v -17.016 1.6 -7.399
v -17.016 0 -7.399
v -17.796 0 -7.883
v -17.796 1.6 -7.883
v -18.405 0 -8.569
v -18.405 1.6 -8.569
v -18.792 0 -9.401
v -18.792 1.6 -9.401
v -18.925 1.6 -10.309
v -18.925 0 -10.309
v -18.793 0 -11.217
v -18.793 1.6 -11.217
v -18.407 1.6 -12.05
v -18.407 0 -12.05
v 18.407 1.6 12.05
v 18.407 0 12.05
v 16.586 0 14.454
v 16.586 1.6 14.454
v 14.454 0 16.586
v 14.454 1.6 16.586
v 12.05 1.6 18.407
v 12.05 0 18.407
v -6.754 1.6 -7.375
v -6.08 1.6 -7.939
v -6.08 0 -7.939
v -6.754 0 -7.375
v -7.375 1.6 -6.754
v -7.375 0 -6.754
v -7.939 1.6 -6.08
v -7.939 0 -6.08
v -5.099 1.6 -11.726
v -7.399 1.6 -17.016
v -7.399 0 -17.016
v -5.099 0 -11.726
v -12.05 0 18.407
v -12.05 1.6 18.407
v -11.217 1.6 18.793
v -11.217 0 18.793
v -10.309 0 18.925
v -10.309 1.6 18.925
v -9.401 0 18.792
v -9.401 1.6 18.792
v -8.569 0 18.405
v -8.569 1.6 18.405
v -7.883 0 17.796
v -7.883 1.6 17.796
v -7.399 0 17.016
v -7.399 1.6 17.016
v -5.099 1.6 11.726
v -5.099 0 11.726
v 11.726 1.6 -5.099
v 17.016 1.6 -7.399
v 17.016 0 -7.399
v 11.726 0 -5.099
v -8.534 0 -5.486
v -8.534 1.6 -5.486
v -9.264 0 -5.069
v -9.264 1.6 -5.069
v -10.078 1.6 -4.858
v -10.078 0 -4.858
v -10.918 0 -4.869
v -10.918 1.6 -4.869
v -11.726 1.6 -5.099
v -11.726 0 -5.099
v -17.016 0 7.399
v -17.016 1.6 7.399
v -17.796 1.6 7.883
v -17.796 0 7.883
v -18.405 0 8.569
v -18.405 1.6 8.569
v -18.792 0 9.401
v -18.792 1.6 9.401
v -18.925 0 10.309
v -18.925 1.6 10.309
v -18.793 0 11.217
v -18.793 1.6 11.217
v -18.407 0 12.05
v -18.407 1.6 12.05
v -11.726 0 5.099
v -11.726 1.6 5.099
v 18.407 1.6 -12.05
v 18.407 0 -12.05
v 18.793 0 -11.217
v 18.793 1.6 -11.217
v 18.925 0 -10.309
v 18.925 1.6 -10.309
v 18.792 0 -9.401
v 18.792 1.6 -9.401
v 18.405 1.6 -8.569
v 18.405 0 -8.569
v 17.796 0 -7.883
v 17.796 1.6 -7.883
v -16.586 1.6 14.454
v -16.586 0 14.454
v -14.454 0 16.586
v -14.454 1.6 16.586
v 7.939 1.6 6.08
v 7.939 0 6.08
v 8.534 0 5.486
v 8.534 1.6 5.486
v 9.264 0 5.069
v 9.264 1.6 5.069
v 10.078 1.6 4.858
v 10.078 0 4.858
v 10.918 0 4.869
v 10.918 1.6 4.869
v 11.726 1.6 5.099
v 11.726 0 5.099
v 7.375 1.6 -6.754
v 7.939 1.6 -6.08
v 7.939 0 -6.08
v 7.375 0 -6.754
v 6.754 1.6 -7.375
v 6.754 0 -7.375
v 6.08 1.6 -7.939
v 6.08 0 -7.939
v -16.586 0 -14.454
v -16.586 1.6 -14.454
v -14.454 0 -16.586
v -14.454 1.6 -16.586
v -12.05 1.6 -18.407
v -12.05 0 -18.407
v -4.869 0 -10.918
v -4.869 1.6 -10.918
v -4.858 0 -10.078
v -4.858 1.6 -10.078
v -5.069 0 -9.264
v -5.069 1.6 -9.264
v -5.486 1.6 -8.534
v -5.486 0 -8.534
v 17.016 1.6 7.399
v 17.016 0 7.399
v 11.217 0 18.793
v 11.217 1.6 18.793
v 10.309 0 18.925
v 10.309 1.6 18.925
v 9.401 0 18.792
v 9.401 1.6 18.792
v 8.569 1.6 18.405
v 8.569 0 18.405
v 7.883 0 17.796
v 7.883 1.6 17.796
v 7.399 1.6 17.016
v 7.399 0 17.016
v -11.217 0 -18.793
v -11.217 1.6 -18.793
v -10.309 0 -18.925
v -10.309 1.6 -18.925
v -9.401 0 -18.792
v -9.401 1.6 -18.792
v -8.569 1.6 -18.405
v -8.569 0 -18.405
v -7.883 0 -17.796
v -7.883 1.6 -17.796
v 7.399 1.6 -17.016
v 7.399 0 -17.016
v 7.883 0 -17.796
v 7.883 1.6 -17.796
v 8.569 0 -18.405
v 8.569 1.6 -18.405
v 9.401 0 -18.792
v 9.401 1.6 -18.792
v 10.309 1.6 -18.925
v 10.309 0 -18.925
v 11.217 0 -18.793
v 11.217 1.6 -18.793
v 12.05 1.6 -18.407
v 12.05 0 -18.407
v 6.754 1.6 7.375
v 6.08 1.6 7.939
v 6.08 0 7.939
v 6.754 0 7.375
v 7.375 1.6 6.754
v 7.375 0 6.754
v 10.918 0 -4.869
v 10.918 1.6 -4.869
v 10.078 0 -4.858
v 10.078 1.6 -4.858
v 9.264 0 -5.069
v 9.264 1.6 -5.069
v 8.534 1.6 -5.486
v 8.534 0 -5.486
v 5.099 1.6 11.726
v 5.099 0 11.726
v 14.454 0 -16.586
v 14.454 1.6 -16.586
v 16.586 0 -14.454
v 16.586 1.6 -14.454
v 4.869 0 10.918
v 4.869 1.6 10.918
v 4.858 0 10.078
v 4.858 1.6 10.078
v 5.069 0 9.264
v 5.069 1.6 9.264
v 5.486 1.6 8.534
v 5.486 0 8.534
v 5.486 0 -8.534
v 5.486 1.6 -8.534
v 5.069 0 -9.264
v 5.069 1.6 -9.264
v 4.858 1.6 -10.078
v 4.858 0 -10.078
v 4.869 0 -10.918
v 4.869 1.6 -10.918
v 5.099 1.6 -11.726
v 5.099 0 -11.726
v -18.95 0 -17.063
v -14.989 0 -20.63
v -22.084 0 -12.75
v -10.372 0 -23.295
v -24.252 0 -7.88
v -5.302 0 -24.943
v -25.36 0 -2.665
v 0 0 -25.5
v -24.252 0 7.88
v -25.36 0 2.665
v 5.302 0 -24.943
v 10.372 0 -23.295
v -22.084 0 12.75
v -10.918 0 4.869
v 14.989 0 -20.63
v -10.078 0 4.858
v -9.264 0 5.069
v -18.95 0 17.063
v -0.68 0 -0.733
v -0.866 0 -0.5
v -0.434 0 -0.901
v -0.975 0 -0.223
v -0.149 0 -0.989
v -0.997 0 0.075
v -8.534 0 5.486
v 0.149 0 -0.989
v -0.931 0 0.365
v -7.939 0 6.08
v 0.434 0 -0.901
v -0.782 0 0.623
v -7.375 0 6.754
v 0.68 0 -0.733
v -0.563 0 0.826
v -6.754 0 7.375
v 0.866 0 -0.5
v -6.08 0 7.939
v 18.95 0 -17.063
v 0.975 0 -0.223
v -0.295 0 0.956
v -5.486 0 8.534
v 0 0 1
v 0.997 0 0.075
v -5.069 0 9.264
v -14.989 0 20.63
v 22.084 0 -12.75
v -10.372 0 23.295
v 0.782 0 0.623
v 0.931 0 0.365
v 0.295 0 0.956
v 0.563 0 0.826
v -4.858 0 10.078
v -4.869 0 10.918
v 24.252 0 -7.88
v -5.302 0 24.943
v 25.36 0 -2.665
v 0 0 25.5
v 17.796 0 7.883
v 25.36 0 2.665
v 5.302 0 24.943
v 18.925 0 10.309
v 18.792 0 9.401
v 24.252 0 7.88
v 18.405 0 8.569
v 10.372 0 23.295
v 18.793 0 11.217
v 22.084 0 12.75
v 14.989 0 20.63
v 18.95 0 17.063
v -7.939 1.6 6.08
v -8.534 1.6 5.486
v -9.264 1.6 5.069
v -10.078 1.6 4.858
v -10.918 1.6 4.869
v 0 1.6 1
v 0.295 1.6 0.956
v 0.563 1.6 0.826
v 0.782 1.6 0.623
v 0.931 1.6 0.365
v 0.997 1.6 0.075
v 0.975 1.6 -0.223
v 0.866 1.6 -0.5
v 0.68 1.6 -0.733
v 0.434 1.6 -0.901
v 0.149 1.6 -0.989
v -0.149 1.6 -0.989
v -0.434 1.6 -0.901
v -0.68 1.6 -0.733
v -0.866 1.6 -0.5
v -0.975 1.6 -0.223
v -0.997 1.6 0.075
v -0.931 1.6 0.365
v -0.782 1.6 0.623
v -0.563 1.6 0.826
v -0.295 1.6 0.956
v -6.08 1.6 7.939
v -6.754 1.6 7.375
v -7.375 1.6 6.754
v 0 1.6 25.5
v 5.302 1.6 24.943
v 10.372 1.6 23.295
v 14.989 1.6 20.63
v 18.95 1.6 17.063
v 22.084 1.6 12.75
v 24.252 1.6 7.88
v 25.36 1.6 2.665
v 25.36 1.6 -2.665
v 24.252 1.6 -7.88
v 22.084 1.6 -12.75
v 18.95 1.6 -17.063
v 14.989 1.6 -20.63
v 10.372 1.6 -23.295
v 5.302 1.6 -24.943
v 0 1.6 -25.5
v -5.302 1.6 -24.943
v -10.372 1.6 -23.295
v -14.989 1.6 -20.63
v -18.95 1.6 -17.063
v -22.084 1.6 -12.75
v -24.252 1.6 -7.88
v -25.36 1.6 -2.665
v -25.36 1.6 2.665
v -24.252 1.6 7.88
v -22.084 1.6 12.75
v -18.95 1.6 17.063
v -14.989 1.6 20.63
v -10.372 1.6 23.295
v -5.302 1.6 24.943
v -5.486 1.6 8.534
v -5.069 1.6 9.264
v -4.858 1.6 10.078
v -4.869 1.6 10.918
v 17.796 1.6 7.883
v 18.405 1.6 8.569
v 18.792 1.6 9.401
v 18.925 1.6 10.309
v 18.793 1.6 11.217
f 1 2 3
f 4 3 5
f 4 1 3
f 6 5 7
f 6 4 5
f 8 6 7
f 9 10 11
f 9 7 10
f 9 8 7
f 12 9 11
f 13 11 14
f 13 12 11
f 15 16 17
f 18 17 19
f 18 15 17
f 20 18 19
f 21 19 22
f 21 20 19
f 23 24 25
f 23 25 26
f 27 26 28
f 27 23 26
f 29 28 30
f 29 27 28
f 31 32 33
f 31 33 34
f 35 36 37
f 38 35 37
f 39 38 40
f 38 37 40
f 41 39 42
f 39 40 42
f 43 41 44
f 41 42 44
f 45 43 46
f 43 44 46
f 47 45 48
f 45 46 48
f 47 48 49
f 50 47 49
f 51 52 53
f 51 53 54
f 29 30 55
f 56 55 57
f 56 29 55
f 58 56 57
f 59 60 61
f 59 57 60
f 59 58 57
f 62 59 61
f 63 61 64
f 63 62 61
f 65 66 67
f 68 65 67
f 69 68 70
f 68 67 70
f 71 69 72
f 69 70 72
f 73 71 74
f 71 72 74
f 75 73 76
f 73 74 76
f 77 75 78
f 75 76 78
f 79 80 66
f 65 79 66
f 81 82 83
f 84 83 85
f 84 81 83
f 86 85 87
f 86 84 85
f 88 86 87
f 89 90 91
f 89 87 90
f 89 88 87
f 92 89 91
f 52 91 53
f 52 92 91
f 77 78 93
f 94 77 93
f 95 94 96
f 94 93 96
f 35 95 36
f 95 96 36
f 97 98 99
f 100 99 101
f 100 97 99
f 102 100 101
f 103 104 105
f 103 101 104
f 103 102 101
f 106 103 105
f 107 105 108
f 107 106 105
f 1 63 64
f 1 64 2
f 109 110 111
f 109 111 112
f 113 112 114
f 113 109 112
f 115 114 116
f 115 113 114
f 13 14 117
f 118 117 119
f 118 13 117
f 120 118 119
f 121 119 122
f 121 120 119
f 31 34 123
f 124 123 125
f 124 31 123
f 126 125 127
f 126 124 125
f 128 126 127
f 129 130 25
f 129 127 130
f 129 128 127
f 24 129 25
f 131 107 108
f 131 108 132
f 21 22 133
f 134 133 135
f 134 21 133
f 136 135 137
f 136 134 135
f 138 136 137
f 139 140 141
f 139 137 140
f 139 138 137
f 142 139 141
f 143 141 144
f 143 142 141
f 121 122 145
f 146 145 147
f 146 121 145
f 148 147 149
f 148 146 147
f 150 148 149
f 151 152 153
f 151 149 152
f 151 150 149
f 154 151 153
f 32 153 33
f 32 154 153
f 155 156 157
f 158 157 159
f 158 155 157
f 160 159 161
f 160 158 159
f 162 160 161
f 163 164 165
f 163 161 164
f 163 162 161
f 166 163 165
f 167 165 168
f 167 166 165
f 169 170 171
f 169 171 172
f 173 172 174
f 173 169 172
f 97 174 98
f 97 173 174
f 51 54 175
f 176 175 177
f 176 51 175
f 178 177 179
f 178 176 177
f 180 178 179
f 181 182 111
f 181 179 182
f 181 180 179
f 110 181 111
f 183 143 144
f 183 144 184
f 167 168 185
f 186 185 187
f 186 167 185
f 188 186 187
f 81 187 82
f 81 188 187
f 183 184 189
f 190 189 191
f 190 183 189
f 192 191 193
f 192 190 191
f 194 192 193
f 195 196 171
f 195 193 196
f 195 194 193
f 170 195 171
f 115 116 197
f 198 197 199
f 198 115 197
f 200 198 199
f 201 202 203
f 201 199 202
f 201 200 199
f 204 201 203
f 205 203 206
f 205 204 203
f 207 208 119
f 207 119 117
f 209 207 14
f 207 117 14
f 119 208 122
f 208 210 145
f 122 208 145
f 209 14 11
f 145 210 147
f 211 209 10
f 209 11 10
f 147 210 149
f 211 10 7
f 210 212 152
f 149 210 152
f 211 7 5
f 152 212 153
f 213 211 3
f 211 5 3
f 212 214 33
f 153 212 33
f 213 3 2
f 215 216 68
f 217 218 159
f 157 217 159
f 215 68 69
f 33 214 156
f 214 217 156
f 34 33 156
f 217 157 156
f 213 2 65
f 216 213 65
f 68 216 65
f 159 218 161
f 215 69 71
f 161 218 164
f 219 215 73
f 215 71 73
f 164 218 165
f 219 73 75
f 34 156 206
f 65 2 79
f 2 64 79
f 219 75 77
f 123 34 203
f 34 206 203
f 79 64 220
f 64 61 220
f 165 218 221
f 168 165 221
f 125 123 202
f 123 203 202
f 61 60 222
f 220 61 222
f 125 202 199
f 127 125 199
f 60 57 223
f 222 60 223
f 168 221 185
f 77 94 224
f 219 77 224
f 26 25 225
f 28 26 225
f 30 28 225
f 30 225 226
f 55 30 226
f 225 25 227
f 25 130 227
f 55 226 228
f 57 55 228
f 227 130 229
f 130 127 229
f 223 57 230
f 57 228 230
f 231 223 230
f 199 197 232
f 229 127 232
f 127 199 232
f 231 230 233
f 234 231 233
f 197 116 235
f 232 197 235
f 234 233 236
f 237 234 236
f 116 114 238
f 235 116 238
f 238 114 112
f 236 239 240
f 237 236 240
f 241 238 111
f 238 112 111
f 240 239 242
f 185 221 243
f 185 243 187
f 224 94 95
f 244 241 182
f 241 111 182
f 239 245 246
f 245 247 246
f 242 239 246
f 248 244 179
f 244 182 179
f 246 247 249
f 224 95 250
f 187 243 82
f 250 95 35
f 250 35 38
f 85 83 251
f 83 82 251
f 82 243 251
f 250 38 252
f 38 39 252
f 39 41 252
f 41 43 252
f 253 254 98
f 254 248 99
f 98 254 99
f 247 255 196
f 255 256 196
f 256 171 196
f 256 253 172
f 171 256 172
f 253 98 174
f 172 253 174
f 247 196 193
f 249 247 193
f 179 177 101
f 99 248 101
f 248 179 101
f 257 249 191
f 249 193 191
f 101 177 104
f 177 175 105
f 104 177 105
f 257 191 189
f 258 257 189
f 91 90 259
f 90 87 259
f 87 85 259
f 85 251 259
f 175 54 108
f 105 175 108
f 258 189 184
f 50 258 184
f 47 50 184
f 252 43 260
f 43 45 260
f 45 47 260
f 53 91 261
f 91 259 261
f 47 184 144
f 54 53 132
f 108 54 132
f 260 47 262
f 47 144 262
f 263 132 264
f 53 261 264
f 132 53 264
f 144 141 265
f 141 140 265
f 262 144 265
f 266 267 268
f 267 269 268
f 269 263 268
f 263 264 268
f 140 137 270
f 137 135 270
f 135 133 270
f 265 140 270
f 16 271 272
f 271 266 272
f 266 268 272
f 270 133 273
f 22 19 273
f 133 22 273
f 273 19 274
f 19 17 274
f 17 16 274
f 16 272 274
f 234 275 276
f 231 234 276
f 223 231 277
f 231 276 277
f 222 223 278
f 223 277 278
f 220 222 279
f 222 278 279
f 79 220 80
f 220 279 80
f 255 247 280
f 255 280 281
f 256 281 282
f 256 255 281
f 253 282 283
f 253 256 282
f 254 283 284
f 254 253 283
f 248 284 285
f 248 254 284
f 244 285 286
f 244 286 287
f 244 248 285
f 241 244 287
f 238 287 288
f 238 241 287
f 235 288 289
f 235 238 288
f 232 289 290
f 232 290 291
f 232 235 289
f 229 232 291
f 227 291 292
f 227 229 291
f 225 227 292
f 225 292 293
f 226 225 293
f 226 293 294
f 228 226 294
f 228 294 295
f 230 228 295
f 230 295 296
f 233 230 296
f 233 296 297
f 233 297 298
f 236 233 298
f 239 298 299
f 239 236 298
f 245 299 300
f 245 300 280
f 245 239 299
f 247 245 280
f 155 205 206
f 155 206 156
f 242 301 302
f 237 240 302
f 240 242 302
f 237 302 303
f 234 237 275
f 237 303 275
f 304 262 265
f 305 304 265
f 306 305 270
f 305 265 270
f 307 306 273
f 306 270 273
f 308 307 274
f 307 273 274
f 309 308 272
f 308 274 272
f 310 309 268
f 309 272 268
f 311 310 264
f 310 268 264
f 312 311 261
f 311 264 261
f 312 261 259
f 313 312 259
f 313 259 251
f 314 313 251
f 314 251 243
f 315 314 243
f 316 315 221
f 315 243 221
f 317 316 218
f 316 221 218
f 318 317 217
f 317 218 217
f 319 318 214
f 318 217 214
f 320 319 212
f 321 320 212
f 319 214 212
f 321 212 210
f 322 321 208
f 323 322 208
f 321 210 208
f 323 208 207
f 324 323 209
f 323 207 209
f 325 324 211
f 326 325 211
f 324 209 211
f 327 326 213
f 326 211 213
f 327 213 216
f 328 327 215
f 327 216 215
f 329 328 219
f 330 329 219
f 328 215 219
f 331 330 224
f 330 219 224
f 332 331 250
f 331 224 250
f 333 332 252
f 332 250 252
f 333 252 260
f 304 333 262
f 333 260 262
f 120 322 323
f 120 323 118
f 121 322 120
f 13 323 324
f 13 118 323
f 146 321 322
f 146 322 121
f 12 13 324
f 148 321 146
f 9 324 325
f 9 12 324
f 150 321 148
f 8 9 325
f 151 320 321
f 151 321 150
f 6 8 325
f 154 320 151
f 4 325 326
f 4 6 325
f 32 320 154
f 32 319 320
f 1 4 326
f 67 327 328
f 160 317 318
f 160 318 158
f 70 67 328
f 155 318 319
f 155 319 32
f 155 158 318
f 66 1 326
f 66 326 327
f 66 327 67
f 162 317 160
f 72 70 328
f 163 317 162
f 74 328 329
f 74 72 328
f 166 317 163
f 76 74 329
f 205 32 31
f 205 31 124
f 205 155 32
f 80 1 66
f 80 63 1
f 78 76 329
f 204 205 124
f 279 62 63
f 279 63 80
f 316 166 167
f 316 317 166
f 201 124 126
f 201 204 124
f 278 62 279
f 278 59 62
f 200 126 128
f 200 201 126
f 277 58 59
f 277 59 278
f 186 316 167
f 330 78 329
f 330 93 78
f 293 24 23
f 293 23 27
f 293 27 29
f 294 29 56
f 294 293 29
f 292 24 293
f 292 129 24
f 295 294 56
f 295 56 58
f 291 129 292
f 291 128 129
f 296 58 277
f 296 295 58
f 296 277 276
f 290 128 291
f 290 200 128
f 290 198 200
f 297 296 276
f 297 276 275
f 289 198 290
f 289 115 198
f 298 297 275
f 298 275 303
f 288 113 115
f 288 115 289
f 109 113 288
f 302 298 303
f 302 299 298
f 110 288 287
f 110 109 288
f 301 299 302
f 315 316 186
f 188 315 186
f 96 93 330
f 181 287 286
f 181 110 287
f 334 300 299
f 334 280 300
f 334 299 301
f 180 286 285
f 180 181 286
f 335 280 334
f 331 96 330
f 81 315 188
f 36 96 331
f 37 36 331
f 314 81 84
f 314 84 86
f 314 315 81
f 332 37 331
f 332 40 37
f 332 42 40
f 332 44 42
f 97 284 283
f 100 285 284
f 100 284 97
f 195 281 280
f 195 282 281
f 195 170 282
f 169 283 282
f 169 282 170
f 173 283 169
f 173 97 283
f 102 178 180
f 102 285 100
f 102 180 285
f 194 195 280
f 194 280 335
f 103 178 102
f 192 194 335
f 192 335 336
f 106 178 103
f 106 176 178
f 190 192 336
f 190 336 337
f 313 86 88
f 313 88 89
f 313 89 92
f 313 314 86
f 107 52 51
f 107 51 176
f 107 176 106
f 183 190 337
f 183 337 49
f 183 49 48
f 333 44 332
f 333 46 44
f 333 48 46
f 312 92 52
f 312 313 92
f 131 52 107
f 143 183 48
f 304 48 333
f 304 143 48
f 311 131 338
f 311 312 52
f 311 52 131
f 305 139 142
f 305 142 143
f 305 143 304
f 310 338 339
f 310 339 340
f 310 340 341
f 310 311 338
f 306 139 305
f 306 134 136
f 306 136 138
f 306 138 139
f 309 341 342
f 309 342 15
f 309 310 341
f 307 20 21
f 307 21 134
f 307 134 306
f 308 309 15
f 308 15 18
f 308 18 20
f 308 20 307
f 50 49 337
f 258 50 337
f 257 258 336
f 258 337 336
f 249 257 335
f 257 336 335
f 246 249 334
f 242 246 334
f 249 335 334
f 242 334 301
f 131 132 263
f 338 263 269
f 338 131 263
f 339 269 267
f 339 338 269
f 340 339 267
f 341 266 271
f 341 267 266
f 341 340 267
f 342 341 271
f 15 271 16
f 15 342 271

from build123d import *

# Parameters (mm, degrees)
SKETCH1_R           = 25.5
SKETCH1_R_2         = 1
BOSS_EXTRUDE1_DEPTH = 1.6
CUT_EXTRUDE1_REACH  = 38.098


with BuildPart() as part:
    # Sketch1 → Boss-Extrude1 (new body)
    with BuildSketch(Plane(origin=(0, 0, 0), x_dir=(1, 0, 0), z_dir=(0, 1, 0))):
        Circle(SKETCH1_R)
        Circle(SKETCH1_R_2, mode=Mode.SUBTRACT)
    extrude(amount=BOSS_EXTRUDE1_DEPTH)

    # Sketch2 → Cut-Extrude1 (cut, up to next)
    with BuildSketch(Plane(origin=(0, 1.6, 0), x_dir=(1, 0, 0), z_dir=(0, 1, 0)), mode=Mode.PRIVATE) as cut_extrude1_sk1:
        with BuildLine():
            Line((5.098689446, 11.726182923), (7.398917645, 17.016345603))
            ThreePointArc((7.398917645, 17.016345603), (9.401129193, 18.792276888), (12.049552955, 18.406745328))
            ThreePointArc((12.049552955, 18.406745328), (15.556349186, 15.556349186), (18.406745328, 12.049552955))
            ThreePointArc((18.406745328, 12.049552955), (18.792276888, 9.401129193), (17.016345603, 7.398917645))
            Line((17.016345603, 7.398917645), (11.726182923, 5.098689446))
            ThreePointArc((11.726182923, 5.098689446), (9.663717077, 4.936869827), (7.939396303, 6.079965983))
            ThreePointArc((7.939396303, 6.079965983), (7.071067812, 7.071067812), (6.079965983, 7.939396303))
            ThreePointArc((6.079965983, 7.939396303), (4.936869827, 9.663717077), (5.098689446, 11.726182923))
        make_face()
    cut_extrude1_tool1 = extrude(cut_extrude1_sk1.sketch, amount=-CUT_EXTRUDE1_REACH, mode=Mode.PRIVATE) & part.part
    # Sketch2 → Cut-Extrude1 (cut, up to next)
    with BuildSketch(Plane(origin=(0, 1.6, 0), x_dir=(1, 0, 0), z_dir=(0, 1, 0)), mode=Mode.PRIVATE) as cut_extrude1_sk2:
        with BuildLine():
            Line((-11.726182923, 5.098689446), (-17.016345603, 7.398917645))
            ThreePointArc((-17.016345603, 7.398917645), (-18.792276888, 9.401129193), (-18.406745328, 12.049552955))
            ThreePointArc((-18.406745328, 12.049552955), (-15.556349186, 15.556349186), (-12.049552955, 18.406745328))
            ThreePointArc((-12.049552955, 18.406745328), (-9.401129193, 18.792276888), (-7.398917645, 17.016345603))
            Line((-7.398917645, 17.016345603), (-5.098689446, 11.726182923))
            ThreePointArc((-5.098689446, 11.726182923), (-4.936869827, 9.663717077), (-6.079965983, 7.939396303))
            ThreePointArc((-6.079965983, 7.939396303), (-7.071067812, 7.071067812), (-7.939396303, 6.079965983))
            ThreePointArc((-7.939396303, 6.079965983), (-9.663717077, 4.936869827), (-11.726182923, 5.098689446))
        make_face()
    cut_extrude1_tool2 = extrude(cut_extrude1_sk2.sketch, amount=-CUT_EXTRUDE1_REACH, mode=Mode.PRIVATE) & part.part
    # Sketch2 → Cut-Extrude1 (cut, up to next)
    with BuildSketch(Plane(origin=(0, 1.6, 0), x_dir=(1, 0, 0), z_dir=(0, 1, 0)), mode=Mode.PRIVATE) as cut_extrude1_sk3:
        with BuildLine():
            Line((-11.726182923, -5.098689446), (-17.016345603, -7.398917645))
            ThreePointArc((-17.016345603, -7.398917645), (-18.792276888, -9.401129193), (-18.406745328, -12.049552955))
            ThreePointArc((-18.406745328, -12.049552955), (-15.556349186, -15.556349186), (-12.049552955, -18.406745328))
            ThreePointArc((-12.049552955, -18.406745328), (-9.401129193, -18.792276888), (-7.398917645, -17.016345603))
            Line((-7.398917645, -17.016345603), (-5.098689446, -11.726182923))
            ThreePointArc((-5.098689446, -11.726182923), (-4.936869827, -9.663717077), (-6.079965983, -7.939396303))
            ThreePointArc((-6.079965983, -7.939396303), (-7.071067812, -7.071067812), (-7.939396303, -6.079965983))
            ThreePointArc((-7.939396303, -6.079965983), (-9.663717077, -4.936869827), (-11.726182923, -5.098689446))
        make_face()
    cut_extrude1_tool3 = extrude(cut_extrude1_sk3.sketch, amount=-CUT_EXTRUDE1_REACH, mode=Mode.PRIVATE) & part.part
    # Sketch2 → Cut-Extrude1 (cut, up to next)
    with BuildSketch(Plane(origin=(0, 1.6, 0), x_dir=(1, 0, 0), z_dir=(0, 1, 0)), mode=Mode.PRIVATE) as cut_extrude1_sk4:
        with BuildLine():
            Line((11.726182923, -5.098689446), (17.016345603, -7.398917645))
            ThreePointArc((17.016345603, -7.398917645), (18.792276888, -9.401129193), (18.406745328, -12.049552955))
            ThreePointArc((18.406745328, -12.049552955), (15.556349186, -15.556349186), (12.049552955, -18.406745328))
            ThreePointArc((12.049552955, -18.406745328), (9.401129193, -18.792276888), (7.398917645, -17.016345603))
            Line((7.398917645, -17.016345603), (5.098689446, -11.726182923))
            ThreePointArc((5.098689446, -11.726182923), (4.936869827, -9.663717077), (6.079965983, -7.939396303))
            ThreePointArc((6.079965983, -7.939396303), (7.071067812, -7.071067812), (7.939396303, -6.079965983))
            ThreePointArc((7.939396303, -6.079965983), (9.663717077, -4.936869827), (11.726182923, -5.098689446))
        make_face()
    cut_extrude1_tool4 = extrude(cut_extrude1_sk4.sketch, amount=-CUT_EXTRUDE1_REACH, mode=Mode.PRIVATE) & part.part
    add(cut_extrude1_tool1.solids().sort_by_distance((11.555905, 1.6, -11.555905))[0], mode=Mode.SUBTRACT)
    add(cut_extrude1_tool2.solids().sort_by_distance((-11.555905, 1.6, -11.555905))[0], mode=Mode.SUBTRACT)
    add(cut_extrude1_tool3.solids().sort_by_distance((-11.555905, 1.6, 11.555905))[0], mode=Mode.SUBTRACT)
    add(cut_extrude1_tool4.solids().sort_by_distance((11.555905, 1.6, 11.555905))[0], mode=Mode.SUBTRACT)


solid = part.part
